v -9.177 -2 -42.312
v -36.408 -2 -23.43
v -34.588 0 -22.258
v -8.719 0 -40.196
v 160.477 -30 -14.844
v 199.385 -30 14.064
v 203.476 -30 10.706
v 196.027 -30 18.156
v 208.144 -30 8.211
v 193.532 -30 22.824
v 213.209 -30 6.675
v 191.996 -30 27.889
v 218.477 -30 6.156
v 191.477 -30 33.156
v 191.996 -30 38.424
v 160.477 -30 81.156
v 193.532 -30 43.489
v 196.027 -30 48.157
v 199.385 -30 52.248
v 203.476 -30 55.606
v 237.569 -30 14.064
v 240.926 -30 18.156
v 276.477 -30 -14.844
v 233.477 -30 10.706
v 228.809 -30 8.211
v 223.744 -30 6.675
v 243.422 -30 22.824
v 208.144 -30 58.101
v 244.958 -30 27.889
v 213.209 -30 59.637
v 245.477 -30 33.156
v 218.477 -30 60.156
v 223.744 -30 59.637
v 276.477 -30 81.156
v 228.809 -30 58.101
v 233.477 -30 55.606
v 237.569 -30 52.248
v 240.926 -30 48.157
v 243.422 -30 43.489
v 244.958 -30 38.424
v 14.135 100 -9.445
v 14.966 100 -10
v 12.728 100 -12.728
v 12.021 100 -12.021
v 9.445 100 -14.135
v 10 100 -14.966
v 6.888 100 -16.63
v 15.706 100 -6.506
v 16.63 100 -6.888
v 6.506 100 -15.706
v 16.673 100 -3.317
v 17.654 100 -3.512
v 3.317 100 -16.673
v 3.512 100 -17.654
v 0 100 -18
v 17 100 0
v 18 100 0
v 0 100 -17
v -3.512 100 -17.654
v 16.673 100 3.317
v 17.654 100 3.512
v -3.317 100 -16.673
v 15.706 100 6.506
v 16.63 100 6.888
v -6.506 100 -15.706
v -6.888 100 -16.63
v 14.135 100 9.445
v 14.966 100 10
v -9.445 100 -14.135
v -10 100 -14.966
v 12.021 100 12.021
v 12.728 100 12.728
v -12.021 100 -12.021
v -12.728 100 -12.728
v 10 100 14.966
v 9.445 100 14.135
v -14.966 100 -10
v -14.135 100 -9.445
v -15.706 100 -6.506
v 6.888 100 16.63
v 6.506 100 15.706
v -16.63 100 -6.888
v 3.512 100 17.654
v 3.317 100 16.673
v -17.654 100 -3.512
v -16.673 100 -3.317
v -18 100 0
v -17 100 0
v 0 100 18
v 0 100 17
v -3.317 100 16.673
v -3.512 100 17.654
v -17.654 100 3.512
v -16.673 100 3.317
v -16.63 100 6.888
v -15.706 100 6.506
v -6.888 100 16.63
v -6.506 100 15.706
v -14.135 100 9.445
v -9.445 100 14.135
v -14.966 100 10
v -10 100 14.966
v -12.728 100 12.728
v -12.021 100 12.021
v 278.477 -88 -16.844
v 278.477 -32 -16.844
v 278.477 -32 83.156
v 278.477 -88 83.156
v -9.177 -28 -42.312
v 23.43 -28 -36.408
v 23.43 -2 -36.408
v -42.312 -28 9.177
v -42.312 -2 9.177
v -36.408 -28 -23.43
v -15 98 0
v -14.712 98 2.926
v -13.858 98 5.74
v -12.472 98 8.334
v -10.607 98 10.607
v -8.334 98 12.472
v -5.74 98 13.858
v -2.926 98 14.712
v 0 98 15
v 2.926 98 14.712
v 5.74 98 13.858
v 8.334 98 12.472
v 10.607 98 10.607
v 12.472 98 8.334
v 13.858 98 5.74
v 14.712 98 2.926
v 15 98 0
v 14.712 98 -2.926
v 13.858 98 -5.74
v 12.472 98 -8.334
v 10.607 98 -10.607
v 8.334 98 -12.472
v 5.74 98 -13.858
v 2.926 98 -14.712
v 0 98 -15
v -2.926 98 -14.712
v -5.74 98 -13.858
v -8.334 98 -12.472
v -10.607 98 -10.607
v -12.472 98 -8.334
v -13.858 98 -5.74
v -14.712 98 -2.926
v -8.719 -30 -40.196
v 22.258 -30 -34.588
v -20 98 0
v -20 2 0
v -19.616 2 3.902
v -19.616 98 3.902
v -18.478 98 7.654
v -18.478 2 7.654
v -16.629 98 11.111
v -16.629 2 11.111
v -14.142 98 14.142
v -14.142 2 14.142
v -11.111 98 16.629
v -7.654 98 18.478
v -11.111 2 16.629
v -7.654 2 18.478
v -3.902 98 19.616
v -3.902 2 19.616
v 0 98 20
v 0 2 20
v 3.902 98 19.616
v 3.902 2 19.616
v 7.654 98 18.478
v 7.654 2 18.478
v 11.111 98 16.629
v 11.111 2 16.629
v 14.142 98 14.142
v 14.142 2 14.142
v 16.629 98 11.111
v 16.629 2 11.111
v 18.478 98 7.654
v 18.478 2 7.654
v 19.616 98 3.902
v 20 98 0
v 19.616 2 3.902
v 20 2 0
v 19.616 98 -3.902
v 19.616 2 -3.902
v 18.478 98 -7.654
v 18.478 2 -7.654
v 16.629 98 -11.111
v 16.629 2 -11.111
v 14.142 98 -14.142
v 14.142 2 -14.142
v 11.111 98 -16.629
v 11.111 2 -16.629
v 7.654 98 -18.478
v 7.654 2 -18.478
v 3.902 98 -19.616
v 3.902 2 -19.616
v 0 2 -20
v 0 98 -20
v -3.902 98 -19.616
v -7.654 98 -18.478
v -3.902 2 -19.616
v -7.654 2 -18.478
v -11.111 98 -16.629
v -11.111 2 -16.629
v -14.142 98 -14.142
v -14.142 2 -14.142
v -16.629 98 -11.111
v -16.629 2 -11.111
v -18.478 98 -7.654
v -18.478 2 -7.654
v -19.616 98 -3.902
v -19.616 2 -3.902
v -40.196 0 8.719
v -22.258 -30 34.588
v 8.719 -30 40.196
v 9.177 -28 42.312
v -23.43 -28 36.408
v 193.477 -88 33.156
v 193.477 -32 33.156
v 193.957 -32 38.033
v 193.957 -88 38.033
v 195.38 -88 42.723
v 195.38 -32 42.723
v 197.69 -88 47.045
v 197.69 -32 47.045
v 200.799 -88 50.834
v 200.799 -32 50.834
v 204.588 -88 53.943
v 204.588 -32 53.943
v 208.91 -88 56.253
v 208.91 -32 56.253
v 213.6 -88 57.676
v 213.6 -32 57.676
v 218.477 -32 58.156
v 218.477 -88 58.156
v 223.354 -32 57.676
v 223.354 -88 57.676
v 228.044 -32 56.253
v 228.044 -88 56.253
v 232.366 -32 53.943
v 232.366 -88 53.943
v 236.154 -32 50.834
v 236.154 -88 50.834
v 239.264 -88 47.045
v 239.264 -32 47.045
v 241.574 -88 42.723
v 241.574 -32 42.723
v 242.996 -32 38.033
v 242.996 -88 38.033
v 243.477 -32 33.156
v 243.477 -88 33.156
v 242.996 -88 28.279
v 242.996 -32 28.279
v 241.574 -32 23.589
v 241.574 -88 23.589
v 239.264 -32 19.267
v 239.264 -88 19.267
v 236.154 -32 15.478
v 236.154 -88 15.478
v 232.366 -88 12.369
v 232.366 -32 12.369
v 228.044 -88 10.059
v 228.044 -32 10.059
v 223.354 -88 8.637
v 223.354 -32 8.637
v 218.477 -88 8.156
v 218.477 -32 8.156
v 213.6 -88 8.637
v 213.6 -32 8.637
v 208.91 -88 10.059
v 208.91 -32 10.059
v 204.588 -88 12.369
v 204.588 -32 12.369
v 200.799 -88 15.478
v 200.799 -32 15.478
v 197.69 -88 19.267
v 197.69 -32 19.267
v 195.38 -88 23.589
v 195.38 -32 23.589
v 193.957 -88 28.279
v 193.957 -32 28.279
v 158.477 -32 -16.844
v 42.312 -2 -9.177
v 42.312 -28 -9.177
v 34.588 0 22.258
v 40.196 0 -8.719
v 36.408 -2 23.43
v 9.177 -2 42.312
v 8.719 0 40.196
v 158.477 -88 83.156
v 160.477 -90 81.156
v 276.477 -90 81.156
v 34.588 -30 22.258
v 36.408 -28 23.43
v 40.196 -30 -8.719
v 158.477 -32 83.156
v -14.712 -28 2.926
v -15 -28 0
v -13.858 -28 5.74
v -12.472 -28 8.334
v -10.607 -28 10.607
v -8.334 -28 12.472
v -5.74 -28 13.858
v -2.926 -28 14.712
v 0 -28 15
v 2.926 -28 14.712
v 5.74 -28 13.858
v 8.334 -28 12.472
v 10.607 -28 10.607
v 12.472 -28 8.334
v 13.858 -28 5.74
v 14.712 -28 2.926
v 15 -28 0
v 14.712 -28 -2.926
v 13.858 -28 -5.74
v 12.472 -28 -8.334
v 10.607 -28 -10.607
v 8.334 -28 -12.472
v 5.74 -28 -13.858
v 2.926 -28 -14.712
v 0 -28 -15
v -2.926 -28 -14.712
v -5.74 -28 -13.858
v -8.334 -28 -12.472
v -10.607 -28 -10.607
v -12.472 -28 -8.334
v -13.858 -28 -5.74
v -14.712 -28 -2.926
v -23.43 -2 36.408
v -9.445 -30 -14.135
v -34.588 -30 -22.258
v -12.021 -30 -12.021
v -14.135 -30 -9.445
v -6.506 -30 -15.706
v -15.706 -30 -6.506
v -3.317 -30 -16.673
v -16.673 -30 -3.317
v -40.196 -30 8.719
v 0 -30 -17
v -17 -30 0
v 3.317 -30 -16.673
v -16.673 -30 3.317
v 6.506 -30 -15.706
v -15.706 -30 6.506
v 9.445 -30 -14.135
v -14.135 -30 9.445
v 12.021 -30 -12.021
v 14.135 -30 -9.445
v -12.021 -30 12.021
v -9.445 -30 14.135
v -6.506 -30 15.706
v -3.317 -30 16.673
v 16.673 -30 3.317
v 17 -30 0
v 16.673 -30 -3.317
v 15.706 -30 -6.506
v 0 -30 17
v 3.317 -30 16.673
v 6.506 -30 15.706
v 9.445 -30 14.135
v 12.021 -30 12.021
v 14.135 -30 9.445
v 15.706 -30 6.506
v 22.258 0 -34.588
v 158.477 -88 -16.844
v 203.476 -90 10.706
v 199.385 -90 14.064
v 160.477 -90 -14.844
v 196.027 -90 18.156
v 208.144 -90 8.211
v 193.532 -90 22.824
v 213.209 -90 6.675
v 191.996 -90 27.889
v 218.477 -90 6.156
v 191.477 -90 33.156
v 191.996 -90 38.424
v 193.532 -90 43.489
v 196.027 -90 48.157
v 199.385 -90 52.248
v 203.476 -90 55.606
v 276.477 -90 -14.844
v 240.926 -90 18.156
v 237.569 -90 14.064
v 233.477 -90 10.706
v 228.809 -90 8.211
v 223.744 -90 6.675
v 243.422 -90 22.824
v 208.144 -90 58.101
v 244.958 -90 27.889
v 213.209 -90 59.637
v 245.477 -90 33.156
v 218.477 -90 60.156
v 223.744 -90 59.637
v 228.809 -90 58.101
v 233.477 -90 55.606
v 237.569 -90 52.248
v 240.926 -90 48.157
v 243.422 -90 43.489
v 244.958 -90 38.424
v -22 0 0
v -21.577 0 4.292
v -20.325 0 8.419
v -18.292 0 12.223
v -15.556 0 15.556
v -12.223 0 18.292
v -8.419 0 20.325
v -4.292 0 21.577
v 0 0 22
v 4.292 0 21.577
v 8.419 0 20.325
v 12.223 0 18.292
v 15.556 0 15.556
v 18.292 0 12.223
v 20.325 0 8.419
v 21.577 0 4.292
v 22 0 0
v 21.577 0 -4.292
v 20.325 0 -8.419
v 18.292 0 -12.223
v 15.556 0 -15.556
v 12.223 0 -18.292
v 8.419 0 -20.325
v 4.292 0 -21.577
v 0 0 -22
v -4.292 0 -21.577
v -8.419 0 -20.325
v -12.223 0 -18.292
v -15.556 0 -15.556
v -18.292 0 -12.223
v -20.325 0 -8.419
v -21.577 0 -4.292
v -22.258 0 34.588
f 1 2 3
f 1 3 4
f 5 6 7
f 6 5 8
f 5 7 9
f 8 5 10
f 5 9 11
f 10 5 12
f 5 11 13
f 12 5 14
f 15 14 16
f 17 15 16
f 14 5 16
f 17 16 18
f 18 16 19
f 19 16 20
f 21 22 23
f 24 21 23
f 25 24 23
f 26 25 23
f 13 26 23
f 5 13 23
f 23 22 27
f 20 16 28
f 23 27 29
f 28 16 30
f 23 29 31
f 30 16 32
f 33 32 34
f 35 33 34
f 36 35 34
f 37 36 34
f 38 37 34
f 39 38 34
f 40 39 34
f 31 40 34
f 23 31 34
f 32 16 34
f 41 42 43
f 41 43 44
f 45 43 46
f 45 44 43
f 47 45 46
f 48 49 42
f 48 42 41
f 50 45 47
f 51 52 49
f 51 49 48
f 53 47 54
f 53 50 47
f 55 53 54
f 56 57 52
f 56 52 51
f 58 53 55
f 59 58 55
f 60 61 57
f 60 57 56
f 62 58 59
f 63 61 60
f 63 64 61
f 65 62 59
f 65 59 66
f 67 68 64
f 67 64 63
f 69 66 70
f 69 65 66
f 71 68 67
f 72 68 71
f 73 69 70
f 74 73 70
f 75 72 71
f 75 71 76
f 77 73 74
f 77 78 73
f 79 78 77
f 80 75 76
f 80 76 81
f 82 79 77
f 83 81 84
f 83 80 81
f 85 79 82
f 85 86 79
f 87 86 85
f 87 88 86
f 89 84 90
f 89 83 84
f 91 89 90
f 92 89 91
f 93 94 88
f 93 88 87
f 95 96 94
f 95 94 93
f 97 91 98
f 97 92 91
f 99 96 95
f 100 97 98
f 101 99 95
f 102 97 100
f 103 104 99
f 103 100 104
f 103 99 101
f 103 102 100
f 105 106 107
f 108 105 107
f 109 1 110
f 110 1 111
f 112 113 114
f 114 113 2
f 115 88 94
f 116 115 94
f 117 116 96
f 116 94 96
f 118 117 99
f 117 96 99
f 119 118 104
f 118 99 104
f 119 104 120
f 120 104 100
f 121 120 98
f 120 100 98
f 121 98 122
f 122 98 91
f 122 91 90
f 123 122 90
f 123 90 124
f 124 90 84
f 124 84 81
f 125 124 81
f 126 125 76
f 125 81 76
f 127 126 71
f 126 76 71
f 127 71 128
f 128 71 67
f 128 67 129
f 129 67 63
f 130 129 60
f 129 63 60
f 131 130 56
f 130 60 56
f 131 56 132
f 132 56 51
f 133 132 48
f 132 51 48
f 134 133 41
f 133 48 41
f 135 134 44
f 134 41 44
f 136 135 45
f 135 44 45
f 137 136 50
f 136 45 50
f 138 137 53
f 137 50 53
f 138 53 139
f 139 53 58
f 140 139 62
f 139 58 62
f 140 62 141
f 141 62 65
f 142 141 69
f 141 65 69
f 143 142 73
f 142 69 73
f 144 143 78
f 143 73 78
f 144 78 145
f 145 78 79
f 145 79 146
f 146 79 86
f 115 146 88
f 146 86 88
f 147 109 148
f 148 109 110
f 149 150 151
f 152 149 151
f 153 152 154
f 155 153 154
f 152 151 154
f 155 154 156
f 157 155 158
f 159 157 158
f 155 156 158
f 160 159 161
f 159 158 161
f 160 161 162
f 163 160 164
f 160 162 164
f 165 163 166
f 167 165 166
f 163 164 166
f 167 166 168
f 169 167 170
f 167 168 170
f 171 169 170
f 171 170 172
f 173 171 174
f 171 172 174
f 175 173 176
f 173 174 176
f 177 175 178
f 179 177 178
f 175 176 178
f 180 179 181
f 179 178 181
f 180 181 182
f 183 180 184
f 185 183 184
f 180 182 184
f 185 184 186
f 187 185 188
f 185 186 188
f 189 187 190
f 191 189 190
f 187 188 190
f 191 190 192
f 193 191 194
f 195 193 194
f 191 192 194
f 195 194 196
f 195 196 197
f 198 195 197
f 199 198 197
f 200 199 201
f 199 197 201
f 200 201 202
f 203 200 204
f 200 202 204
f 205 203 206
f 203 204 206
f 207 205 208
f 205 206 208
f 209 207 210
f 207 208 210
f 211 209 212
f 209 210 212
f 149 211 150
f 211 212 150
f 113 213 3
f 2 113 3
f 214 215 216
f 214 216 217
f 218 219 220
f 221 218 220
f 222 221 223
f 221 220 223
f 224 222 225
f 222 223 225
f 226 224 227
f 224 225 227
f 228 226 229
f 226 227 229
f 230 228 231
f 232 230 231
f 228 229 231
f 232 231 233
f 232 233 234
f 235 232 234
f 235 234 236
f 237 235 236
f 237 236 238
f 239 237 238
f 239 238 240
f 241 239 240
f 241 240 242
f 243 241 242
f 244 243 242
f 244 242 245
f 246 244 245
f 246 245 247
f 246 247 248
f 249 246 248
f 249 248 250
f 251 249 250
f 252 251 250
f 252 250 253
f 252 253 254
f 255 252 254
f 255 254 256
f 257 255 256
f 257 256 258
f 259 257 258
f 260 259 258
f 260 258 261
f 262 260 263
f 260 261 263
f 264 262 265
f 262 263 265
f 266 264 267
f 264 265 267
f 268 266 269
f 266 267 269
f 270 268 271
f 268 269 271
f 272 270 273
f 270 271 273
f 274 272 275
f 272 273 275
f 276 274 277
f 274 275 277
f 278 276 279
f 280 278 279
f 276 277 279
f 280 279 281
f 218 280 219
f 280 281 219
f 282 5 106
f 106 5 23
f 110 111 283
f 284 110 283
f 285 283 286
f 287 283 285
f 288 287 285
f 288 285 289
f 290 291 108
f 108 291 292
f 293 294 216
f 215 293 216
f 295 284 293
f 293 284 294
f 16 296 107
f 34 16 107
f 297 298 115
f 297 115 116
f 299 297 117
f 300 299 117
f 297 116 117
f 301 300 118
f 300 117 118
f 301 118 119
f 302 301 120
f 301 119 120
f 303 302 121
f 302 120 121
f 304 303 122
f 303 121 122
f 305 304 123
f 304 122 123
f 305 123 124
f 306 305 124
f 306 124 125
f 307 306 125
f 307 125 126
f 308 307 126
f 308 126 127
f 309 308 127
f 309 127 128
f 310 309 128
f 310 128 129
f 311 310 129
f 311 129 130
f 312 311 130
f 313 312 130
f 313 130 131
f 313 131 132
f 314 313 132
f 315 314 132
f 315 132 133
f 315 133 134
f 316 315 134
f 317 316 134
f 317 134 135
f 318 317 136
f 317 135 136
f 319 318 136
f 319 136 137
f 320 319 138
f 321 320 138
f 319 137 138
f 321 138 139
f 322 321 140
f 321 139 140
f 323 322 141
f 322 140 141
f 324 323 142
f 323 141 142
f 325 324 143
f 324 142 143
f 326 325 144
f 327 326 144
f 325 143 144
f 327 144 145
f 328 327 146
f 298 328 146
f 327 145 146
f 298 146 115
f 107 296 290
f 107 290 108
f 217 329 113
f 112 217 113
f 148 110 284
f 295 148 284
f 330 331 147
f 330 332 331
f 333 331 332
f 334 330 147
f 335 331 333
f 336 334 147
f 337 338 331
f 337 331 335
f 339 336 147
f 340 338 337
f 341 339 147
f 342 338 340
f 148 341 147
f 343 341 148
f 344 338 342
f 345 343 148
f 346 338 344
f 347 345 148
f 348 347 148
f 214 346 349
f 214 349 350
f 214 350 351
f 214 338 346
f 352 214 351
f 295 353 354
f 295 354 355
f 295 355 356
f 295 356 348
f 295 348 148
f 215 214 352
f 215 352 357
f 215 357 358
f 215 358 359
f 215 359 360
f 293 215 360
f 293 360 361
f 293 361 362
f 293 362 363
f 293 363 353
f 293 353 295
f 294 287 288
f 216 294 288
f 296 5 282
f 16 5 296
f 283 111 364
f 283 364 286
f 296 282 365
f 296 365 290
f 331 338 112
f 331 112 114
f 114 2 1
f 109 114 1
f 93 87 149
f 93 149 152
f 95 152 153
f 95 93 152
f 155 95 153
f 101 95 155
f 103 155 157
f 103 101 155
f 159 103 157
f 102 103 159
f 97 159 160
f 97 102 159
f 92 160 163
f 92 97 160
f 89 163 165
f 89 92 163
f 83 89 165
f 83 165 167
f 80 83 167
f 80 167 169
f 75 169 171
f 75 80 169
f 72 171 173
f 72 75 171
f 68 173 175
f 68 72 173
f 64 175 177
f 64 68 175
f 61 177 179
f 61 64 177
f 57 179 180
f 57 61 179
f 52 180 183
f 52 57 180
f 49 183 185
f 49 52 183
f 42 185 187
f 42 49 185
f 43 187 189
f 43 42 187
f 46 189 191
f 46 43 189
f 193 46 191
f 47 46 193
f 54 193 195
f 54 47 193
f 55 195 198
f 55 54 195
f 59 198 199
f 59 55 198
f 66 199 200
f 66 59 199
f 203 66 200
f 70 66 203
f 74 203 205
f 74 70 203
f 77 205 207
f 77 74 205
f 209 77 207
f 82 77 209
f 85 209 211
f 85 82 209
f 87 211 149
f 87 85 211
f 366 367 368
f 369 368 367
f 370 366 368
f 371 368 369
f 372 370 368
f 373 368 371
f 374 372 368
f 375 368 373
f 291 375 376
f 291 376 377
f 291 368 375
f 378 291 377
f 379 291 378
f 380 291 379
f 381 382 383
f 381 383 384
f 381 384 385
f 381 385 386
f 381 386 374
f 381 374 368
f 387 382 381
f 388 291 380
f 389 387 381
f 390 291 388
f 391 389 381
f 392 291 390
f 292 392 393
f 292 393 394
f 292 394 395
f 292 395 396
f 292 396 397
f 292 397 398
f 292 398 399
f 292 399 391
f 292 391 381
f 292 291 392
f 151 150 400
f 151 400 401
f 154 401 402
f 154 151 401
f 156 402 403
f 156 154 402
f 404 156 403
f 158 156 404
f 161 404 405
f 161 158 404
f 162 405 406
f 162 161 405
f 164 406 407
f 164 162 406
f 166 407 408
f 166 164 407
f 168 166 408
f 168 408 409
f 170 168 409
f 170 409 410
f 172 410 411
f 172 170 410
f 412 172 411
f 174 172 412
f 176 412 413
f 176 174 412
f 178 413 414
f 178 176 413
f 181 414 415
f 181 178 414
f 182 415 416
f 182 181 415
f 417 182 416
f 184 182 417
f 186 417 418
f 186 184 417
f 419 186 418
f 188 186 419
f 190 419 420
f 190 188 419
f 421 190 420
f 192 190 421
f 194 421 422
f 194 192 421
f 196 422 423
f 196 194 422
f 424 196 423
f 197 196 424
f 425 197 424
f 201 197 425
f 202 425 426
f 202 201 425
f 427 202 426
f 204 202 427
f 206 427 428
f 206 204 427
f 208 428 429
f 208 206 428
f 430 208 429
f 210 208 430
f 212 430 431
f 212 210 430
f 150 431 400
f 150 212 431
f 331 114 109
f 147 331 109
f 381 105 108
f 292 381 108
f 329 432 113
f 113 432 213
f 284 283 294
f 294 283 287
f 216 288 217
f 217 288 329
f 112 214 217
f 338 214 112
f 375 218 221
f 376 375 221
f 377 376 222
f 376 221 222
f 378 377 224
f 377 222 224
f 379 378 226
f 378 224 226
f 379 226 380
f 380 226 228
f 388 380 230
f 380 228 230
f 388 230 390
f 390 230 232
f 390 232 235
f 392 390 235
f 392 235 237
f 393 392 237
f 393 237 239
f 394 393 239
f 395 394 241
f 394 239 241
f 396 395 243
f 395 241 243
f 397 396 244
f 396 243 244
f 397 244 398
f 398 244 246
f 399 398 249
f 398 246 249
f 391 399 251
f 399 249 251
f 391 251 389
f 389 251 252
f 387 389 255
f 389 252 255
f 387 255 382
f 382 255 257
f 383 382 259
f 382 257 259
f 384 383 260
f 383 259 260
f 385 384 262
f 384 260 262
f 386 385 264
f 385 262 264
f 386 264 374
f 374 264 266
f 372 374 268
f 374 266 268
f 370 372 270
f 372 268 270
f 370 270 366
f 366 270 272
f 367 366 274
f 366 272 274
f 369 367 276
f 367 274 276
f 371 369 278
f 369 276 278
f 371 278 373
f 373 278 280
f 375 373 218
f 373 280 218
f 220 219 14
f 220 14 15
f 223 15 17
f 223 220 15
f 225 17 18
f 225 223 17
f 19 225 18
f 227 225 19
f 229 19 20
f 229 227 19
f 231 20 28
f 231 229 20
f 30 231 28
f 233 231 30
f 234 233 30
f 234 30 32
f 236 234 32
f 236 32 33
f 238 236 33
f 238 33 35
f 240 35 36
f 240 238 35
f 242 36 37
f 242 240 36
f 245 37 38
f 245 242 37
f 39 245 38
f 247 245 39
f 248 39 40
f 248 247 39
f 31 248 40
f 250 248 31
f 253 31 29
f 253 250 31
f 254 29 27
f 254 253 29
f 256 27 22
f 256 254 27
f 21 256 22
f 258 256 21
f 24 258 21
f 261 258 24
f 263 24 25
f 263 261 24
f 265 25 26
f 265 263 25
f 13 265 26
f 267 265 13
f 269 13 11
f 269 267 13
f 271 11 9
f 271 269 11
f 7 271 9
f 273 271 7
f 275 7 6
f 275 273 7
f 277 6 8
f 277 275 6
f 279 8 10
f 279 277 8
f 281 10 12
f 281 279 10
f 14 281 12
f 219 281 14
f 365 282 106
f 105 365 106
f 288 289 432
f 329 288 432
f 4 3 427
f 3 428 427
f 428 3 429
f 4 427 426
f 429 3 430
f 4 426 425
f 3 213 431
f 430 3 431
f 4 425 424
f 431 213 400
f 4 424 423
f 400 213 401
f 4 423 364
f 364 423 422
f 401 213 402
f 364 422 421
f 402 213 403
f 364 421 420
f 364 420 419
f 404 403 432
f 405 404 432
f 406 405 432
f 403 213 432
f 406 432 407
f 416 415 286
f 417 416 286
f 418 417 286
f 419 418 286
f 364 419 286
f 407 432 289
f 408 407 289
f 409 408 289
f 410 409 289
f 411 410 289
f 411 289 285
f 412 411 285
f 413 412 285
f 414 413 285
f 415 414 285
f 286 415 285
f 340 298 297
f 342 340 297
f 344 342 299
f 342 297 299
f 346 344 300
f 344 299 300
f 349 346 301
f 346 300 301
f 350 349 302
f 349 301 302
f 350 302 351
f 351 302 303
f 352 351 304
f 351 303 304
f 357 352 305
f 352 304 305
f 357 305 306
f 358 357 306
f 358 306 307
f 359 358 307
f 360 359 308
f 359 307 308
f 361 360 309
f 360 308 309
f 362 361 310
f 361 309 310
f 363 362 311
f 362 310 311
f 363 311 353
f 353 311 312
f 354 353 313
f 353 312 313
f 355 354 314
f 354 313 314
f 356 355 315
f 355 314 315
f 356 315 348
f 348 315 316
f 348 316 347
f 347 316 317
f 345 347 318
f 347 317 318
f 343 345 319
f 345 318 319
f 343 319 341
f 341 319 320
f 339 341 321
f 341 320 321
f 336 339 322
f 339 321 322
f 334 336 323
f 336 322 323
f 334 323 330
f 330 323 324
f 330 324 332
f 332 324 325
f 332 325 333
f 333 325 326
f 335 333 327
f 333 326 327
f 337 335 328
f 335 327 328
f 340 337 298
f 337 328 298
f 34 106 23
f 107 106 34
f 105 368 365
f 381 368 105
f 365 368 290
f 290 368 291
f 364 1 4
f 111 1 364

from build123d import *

# Parameters (mm, degrees)
F1_DEPTH = 30
F2_R     = 20
F3_DEPTH = 100
F5_D     = 30
F6_SIZE  = 2
F7_W     = 120
F7_H     = 100
F8_DEPTH = 60
F10_D    = 50
F11_SIZE = 2
F12_SIZE = 2


# Not quite as in the source:
# - a feature of the source that left no trace in its solid (it failed there, or was rolled back) is left out


with BuildPart() as f1:
    # F0 (on Front) → F1 (new body)
    with BuildSketch(Plane.XZ):
        Polygon((-23.4295373742, 36.4084245586), (-42.311828655, 9.1774591404), (-36.4084245586, -23.4295373742), (-9.1774591404, -42.311828655), (23.4295373742, -36.4084245586), (42.311828655, -9.1774591404), (36.4084245586, 23.4295373742), (9.1774591404, 42.311828655), align=None)
    extrude(amount=F1_DEPTH)

    # F2 (on face) → F3 (join)
    with BuildSketch(Plane(origin=(0, 0, 0), x_dir=(-1, 0, 0), z_dir=(0, 1, 0))):
        Circle(F2_R)
    extrude(amount=F3_DEPTH)

    # F5 (through all)
    with Locations(Plane.XZ.offset(30)):
        with Locations((0, 0)):
            Hole(F5_D / 2)

    # F6
    f6_edges = [f1.edges().sort_by_distance(p)[0] for p in [
        (20, 100, 0),
        (-7.126039, 0, 39.360127),
        (-7.126039, -30, 39.360127),
        (22.792942, 0, 32.870683),
        (22.792942, -30, 32.870683),
        (-32.870683, 0, 22.792942),
        (-32.870683, -30, 22.792942),
        (39.360127, 0, 7.126039),
        (-39.360127, 0, -7.126039),
        (32.870683, 0, -22.792942),
        (-22.792942, 0, -32.870683),
        (7.126039, 0, -39.360127),
        (20, 0, 0),
        (39.360127, -30, 7.126039),
        (-39.360127, -30, -7.126039),
        (32.870683, -30, -22.792942),
        (-22.792942, -30, -32.870683),
        (7.126039, -30, -39.360127),
        (-15, -30, 0),
        (-15, 100, 0),
    ]]
    chamfer(f6_edges, length=F6_SIZE)


with BuildPart() as f8:
    # F7 (on face) → F8 (new body)
    with BuildSketch(Plane.XZ.offset(30)):
        with Locations((218.4767627038, 33.1561379135)):
            Rectangle(F7_W, F7_H)
    extrude(amount=F8_DEPTH)

    # F10 (through all)
    with Locations(Plane.XZ.offset(90)):
        with Locations((218.4767627038, 33.1561379135)):
            Hole(F10_D / 2)

    # F11
    f11_edges = [f8.edges().sort_by_distance(p)[0] for p in [
        (218.476763, -90, 83.156138),
        (278.476763, -90, 33.156138),
        (158.476763, -90, 33.156138),
        (218.476763, -90, -16.843862),
        (193.476763, -90, 33.156138),
    ]]
    chamfer(f11_edges, length=F11_SIZE)

    # F12
    f12_edges = [f8.edges().sort_by_distance(p)[0] for p in [
        (218.476763, -30, 83.156138),
        (278.476763, -30, 33.156138),
        (158.476763, -30, 33.156138),
        (218.476763, -30, -16.843862),
        (193.476763, -30, 33.156138),
    ]]
    chamfer(f12_edges, length=F12_SIZE)


solid = Compound([f1.part, f8.part])
